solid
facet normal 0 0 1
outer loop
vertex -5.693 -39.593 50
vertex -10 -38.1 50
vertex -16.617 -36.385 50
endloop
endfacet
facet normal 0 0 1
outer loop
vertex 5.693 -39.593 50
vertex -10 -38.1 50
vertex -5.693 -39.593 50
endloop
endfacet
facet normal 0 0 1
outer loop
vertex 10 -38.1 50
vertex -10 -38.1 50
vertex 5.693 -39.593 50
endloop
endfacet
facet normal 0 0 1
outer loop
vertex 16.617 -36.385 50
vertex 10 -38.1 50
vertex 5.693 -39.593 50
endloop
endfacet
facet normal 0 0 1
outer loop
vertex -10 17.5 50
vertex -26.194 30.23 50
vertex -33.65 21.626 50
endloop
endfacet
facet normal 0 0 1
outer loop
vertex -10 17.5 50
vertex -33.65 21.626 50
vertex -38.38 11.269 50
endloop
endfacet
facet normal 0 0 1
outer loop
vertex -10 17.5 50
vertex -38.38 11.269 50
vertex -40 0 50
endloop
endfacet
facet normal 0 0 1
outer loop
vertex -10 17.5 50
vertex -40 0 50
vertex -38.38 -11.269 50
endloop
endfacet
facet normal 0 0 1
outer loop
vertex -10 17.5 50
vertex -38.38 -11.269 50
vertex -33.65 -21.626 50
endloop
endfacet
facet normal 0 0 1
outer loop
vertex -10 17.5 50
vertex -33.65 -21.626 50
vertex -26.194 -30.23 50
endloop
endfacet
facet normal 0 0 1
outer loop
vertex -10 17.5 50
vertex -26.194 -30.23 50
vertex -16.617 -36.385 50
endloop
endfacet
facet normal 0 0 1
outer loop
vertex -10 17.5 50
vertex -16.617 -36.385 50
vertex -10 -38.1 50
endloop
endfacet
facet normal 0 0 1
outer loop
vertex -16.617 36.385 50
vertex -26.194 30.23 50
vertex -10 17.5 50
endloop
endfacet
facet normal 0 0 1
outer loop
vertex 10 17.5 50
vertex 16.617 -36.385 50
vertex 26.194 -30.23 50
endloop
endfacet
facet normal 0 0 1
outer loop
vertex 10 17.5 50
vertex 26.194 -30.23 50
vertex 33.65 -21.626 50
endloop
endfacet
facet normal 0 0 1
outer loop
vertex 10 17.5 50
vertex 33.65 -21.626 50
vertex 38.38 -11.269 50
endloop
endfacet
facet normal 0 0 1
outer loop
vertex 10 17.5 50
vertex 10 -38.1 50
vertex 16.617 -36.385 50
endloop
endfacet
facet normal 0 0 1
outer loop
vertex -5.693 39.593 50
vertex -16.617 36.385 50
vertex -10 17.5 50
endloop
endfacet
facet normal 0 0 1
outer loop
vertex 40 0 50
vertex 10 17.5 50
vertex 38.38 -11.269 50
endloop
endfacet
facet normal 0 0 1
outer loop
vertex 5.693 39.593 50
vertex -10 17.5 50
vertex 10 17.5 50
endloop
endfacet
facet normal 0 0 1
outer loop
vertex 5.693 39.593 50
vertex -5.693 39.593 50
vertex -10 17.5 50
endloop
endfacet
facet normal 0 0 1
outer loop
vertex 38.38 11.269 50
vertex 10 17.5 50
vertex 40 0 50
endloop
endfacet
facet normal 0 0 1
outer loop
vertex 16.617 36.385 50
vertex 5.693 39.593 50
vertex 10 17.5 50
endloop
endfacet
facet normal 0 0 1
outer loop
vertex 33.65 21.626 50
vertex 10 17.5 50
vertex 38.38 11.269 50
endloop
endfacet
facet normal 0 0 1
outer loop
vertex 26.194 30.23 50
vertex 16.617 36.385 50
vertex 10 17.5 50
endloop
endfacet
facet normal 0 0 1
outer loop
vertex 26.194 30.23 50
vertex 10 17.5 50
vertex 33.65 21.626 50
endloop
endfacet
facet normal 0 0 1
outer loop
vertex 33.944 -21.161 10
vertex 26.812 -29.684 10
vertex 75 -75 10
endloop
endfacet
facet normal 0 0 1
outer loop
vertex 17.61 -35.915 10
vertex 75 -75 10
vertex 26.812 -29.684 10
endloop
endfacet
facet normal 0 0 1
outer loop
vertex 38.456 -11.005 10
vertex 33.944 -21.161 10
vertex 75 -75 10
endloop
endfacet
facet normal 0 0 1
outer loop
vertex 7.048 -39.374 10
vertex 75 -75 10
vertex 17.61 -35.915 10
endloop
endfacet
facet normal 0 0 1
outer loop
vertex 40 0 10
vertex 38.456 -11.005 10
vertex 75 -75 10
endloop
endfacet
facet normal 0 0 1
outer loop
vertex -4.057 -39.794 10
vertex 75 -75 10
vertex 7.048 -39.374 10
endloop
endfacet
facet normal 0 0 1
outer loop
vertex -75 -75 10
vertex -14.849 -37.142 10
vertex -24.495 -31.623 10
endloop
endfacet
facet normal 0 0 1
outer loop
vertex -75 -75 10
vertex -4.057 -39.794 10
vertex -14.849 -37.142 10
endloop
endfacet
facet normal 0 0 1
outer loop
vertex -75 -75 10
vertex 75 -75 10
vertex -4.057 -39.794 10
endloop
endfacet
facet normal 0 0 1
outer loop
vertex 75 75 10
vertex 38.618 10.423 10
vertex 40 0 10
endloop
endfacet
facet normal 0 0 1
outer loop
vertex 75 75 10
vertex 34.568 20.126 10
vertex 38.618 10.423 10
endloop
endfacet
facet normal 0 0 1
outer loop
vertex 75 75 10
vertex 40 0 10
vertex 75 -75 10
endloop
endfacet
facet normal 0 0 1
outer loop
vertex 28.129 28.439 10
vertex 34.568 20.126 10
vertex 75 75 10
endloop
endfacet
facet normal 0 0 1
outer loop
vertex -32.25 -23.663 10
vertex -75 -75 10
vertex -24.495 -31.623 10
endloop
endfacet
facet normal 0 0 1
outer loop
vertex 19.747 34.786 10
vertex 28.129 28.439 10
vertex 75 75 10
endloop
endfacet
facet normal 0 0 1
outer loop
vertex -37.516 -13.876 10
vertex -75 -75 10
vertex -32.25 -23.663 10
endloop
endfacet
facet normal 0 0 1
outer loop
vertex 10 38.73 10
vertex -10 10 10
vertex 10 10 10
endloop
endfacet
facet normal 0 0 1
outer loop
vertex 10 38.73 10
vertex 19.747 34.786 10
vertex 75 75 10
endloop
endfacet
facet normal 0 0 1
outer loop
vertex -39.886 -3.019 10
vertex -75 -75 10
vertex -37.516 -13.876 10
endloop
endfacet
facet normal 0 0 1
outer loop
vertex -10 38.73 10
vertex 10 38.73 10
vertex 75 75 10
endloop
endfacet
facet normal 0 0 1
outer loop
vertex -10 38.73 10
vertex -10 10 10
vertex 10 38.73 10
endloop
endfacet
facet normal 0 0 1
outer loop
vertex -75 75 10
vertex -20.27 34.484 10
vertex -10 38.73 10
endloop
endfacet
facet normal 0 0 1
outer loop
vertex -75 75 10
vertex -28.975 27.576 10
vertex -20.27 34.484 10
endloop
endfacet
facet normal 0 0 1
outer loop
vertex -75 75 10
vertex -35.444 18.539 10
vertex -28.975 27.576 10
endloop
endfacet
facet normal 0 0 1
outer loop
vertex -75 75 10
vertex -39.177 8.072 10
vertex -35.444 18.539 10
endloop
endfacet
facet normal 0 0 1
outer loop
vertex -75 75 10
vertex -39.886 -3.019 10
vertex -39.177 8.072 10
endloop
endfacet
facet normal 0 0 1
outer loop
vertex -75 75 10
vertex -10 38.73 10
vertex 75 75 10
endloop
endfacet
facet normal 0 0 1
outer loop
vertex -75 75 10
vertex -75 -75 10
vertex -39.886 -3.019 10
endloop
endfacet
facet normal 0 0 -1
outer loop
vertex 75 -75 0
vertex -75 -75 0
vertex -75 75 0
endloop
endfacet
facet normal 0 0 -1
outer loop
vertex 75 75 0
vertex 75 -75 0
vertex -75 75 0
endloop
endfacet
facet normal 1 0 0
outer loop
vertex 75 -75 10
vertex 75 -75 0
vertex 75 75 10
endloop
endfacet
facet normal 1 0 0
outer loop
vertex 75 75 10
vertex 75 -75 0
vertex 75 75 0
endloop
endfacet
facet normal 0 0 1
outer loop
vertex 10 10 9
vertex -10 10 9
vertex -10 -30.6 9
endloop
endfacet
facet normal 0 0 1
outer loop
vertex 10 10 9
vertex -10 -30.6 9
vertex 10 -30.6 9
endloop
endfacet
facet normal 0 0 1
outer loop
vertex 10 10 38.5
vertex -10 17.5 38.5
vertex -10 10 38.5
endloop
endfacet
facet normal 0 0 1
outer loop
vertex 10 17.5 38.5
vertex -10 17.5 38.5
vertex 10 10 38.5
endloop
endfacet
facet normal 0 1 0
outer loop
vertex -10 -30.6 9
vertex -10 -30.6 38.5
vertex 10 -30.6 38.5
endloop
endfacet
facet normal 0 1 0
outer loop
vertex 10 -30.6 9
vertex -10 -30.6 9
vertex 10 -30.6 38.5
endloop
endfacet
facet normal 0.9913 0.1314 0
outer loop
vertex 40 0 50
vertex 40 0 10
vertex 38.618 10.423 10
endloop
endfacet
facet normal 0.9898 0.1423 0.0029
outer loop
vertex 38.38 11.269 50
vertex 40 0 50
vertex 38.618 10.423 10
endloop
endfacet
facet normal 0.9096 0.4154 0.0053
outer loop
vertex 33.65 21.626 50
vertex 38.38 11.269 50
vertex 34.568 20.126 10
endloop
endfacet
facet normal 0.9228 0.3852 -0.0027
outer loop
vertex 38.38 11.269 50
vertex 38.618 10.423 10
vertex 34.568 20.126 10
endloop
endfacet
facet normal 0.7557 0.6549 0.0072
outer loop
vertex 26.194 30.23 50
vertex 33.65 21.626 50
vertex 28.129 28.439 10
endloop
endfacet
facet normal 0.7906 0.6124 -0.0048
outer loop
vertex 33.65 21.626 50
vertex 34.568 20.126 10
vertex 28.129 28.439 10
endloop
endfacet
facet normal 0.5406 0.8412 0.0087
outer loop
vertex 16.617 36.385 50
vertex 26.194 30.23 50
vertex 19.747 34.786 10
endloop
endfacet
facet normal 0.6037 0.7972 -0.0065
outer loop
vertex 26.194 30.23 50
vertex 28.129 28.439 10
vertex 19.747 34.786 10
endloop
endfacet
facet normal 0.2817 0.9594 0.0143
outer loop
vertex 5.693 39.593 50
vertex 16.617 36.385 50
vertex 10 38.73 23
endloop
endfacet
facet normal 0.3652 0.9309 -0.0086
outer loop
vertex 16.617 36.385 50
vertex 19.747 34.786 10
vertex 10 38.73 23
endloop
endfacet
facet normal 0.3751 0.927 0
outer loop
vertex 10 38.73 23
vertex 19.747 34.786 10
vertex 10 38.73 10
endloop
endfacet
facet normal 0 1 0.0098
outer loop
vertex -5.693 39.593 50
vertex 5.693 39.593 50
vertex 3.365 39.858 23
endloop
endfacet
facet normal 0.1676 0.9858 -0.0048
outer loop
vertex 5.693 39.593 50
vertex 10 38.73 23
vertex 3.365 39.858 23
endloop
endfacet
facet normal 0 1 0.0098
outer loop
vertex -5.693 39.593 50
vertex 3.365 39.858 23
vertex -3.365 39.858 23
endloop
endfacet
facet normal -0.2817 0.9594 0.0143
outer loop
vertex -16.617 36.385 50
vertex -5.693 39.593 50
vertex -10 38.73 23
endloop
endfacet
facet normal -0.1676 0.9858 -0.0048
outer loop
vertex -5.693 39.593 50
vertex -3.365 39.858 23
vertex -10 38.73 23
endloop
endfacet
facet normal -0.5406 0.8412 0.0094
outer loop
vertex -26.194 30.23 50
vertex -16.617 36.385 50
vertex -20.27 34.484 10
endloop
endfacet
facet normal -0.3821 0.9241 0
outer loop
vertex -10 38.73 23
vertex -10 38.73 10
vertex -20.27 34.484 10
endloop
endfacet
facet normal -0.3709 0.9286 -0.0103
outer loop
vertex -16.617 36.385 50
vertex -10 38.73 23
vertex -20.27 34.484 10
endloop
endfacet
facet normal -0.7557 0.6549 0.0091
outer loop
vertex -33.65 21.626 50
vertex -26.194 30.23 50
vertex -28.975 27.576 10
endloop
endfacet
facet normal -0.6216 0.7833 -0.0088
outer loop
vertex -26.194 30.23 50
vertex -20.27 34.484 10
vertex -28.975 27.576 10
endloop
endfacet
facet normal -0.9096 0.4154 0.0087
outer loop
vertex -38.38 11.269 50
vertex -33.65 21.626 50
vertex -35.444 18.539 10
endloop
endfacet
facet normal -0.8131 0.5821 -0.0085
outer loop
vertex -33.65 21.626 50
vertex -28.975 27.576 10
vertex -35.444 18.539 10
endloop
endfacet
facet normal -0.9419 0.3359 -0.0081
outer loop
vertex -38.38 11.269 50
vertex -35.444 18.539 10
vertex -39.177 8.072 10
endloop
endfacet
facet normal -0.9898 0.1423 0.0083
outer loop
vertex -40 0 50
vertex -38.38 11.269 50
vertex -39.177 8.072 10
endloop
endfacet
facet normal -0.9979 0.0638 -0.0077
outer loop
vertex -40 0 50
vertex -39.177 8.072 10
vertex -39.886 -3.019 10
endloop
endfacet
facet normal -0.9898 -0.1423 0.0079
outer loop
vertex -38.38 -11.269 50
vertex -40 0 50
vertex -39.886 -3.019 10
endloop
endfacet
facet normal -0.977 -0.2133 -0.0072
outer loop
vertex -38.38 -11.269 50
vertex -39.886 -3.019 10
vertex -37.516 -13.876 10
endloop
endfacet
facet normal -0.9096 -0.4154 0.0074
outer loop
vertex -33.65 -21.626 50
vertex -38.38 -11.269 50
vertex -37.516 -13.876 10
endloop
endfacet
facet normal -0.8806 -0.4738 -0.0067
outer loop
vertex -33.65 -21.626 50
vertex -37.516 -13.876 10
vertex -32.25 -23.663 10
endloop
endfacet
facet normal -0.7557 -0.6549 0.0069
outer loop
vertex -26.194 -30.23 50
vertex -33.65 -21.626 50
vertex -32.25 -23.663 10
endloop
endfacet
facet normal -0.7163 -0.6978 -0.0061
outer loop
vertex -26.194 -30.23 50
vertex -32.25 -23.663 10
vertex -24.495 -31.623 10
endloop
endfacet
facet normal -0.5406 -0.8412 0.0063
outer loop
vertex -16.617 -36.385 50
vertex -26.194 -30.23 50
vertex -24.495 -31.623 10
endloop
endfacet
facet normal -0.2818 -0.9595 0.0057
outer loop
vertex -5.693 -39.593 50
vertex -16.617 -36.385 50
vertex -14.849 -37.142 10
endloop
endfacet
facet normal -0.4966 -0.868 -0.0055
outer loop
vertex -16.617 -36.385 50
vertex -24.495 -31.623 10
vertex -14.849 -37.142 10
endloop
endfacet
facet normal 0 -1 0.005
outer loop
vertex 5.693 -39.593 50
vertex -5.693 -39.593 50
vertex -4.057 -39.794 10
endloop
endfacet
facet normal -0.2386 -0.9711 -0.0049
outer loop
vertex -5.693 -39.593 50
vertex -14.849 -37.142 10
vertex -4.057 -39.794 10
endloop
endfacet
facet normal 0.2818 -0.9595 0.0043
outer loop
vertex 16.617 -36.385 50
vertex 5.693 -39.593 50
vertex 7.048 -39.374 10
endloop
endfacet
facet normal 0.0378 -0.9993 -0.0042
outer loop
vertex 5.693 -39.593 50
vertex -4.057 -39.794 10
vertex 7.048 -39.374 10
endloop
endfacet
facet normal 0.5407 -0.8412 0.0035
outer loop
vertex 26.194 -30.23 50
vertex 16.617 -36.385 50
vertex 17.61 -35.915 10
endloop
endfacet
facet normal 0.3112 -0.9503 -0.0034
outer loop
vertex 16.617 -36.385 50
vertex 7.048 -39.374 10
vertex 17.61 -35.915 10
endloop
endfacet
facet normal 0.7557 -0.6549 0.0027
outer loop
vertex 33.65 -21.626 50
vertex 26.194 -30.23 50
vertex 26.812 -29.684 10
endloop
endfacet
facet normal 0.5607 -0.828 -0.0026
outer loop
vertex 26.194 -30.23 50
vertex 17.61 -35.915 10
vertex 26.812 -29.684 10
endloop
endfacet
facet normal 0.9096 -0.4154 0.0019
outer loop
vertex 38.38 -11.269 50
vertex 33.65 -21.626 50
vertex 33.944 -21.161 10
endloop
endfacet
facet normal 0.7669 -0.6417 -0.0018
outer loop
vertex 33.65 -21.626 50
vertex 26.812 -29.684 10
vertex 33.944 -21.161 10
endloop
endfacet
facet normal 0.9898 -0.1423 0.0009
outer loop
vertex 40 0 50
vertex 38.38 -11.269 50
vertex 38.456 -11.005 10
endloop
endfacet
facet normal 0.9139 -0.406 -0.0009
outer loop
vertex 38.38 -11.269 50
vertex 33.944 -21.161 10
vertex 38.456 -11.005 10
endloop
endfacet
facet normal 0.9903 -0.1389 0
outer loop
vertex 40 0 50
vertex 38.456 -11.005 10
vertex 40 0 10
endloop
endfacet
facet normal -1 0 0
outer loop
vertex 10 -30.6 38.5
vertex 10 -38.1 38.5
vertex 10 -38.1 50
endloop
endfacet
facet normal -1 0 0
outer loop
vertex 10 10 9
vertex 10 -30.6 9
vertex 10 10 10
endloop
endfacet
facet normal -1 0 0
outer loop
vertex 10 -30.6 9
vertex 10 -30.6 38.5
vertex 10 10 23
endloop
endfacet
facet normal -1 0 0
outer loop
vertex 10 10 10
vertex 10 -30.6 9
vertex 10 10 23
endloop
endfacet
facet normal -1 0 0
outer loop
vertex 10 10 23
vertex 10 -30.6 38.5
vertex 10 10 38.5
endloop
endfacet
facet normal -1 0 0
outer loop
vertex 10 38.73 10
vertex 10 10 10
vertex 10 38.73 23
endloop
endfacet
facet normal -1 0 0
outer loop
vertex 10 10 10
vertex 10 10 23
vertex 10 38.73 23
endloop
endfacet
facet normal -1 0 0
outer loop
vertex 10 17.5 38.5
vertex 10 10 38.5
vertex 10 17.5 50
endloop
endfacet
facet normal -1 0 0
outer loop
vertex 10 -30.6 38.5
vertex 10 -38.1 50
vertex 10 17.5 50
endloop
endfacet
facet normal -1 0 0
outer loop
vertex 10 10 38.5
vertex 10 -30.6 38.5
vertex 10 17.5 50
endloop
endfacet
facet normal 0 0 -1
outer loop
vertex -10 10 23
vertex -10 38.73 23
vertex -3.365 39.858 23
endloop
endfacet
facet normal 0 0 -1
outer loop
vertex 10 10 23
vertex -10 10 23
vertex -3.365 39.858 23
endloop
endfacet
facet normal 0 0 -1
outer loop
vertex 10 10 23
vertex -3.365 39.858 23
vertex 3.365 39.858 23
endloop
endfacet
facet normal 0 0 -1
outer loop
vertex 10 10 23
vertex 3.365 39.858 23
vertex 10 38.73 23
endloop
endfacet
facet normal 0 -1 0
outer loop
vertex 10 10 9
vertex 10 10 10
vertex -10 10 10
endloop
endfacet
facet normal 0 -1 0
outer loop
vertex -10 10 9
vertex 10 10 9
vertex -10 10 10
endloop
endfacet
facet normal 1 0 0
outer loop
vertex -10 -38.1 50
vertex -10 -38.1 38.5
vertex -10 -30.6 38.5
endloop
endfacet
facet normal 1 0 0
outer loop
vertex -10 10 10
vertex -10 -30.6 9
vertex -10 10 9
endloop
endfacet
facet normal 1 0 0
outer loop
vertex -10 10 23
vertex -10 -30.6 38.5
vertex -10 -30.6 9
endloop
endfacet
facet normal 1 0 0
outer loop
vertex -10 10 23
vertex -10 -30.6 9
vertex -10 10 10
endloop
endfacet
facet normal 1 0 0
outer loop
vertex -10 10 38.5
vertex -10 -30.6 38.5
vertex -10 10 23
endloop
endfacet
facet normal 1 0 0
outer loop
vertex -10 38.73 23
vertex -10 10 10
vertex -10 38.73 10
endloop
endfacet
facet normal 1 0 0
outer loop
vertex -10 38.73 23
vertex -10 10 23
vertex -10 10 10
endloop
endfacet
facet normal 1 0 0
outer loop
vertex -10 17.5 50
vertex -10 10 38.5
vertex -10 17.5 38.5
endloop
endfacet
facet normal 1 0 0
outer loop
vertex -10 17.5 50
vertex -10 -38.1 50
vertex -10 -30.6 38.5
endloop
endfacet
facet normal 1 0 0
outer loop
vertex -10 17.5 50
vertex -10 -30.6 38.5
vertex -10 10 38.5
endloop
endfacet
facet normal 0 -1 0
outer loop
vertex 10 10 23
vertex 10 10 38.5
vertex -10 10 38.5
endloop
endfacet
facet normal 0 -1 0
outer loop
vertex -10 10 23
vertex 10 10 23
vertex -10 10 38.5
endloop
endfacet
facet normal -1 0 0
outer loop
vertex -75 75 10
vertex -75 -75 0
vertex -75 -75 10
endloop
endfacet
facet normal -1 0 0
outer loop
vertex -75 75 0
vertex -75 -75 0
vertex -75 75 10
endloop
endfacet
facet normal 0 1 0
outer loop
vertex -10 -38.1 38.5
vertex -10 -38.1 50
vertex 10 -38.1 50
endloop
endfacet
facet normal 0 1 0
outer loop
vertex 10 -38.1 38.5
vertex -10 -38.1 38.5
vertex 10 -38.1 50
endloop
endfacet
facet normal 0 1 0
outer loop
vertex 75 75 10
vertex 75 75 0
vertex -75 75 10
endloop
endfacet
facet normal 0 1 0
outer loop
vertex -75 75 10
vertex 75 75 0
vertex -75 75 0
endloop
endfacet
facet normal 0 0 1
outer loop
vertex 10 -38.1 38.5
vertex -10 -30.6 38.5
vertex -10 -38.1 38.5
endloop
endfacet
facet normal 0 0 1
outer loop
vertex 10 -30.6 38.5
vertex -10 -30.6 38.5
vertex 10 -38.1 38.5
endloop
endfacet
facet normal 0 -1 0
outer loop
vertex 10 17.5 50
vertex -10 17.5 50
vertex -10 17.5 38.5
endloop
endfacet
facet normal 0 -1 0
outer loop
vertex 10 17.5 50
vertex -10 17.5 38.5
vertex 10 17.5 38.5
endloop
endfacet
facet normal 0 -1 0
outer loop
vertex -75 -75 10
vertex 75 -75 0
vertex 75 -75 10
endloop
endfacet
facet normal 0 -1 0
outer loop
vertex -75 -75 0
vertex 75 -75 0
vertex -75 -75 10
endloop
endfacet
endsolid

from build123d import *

# Parameters (mm, degrees)
CROQUIS1_W              = 150
CROQUIS1_H              = 150
SALIENTE_EXTRUIR1_DEPTH = 10
CROQUIS2_R              = 40
SALIENTE_EXTRUIR2_DEPTH = 40
CORTAR_EXTRUIR1_DEPTH   = 41
CROQUIS4_W              = 20
CROQUIS4_H              = 7.5
CORTAR_EXTRUIR2_DEPTH   = 11.5
CORTAR_EXTRUIR3_START   = -27
CROQUIS5_W              = 20
CROQUIS5_H              = 34.531245334
CORTAR_EXTRUIR3_DEPTH   = 13


with BuildPart() as part:
    # Croquis1 → Saliente-Extruir1 (new body)
    with BuildSketch(Plane(origin=(0, 0, 0), x_dir=(0, 1, 0), z_dir=(0, 0, 1))):
        Rectangle(CROQUIS1_W, CROQUIS1_H)
    extrude(amount=SALIENTE_EXTRUIR1_DEPTH)

    # Croquis2 → Saliente-Extruir2 (add)
    with BuildSketch(Plane.XY.offset(10)):
        Circle(CROQUIS2_R)
    extrude(amount=SALIENTE_EXTRUIR2_DEPTH)

    # Croquis3 → Cortar-Extruir1 (cut)
    with BuildSketch(Plane.XY.offset(50)):
        Polygon((0, 10), (-10, 10), (-10, -30.6), (10, -30.6), (10, 10), align=None)
    extrude(amount=-CORTAR_EXTRUIR1_DEPTH, mode=Mode.SUBTRACT)

    # Croquis4 → Cortar-Extruir2 (cut)
    with BuildSketch(Plane.XY.offset(50)):
        with Locations((0, -34.35)):
            Rectangle(CROQUIS4_W, CROQUIS4_H)
        with Locations((0, 13.75)):
            Rectangle(CROQUIS4_W, CROQUIS4_H)
    extrude(amount=-CORTAR_EXTRUIR2_DEPTH, mode=Mode.SUBTRACT)

    # Croquis5 → Cortar-Extruir3 (cut)
    with BuildSketch(Plane.XY.offset(50).offset(CORTAR_EXTRUIR3_START)):
        with Locations((0, 27.265622667)):
            Rectangle(CROQUIS5_W, CROQUIS5_H)
    extrude(amount=-CORTAR_EXTRUIR3_DEPTH, mode=Mode.SUBTRACT)


solid = part.part
